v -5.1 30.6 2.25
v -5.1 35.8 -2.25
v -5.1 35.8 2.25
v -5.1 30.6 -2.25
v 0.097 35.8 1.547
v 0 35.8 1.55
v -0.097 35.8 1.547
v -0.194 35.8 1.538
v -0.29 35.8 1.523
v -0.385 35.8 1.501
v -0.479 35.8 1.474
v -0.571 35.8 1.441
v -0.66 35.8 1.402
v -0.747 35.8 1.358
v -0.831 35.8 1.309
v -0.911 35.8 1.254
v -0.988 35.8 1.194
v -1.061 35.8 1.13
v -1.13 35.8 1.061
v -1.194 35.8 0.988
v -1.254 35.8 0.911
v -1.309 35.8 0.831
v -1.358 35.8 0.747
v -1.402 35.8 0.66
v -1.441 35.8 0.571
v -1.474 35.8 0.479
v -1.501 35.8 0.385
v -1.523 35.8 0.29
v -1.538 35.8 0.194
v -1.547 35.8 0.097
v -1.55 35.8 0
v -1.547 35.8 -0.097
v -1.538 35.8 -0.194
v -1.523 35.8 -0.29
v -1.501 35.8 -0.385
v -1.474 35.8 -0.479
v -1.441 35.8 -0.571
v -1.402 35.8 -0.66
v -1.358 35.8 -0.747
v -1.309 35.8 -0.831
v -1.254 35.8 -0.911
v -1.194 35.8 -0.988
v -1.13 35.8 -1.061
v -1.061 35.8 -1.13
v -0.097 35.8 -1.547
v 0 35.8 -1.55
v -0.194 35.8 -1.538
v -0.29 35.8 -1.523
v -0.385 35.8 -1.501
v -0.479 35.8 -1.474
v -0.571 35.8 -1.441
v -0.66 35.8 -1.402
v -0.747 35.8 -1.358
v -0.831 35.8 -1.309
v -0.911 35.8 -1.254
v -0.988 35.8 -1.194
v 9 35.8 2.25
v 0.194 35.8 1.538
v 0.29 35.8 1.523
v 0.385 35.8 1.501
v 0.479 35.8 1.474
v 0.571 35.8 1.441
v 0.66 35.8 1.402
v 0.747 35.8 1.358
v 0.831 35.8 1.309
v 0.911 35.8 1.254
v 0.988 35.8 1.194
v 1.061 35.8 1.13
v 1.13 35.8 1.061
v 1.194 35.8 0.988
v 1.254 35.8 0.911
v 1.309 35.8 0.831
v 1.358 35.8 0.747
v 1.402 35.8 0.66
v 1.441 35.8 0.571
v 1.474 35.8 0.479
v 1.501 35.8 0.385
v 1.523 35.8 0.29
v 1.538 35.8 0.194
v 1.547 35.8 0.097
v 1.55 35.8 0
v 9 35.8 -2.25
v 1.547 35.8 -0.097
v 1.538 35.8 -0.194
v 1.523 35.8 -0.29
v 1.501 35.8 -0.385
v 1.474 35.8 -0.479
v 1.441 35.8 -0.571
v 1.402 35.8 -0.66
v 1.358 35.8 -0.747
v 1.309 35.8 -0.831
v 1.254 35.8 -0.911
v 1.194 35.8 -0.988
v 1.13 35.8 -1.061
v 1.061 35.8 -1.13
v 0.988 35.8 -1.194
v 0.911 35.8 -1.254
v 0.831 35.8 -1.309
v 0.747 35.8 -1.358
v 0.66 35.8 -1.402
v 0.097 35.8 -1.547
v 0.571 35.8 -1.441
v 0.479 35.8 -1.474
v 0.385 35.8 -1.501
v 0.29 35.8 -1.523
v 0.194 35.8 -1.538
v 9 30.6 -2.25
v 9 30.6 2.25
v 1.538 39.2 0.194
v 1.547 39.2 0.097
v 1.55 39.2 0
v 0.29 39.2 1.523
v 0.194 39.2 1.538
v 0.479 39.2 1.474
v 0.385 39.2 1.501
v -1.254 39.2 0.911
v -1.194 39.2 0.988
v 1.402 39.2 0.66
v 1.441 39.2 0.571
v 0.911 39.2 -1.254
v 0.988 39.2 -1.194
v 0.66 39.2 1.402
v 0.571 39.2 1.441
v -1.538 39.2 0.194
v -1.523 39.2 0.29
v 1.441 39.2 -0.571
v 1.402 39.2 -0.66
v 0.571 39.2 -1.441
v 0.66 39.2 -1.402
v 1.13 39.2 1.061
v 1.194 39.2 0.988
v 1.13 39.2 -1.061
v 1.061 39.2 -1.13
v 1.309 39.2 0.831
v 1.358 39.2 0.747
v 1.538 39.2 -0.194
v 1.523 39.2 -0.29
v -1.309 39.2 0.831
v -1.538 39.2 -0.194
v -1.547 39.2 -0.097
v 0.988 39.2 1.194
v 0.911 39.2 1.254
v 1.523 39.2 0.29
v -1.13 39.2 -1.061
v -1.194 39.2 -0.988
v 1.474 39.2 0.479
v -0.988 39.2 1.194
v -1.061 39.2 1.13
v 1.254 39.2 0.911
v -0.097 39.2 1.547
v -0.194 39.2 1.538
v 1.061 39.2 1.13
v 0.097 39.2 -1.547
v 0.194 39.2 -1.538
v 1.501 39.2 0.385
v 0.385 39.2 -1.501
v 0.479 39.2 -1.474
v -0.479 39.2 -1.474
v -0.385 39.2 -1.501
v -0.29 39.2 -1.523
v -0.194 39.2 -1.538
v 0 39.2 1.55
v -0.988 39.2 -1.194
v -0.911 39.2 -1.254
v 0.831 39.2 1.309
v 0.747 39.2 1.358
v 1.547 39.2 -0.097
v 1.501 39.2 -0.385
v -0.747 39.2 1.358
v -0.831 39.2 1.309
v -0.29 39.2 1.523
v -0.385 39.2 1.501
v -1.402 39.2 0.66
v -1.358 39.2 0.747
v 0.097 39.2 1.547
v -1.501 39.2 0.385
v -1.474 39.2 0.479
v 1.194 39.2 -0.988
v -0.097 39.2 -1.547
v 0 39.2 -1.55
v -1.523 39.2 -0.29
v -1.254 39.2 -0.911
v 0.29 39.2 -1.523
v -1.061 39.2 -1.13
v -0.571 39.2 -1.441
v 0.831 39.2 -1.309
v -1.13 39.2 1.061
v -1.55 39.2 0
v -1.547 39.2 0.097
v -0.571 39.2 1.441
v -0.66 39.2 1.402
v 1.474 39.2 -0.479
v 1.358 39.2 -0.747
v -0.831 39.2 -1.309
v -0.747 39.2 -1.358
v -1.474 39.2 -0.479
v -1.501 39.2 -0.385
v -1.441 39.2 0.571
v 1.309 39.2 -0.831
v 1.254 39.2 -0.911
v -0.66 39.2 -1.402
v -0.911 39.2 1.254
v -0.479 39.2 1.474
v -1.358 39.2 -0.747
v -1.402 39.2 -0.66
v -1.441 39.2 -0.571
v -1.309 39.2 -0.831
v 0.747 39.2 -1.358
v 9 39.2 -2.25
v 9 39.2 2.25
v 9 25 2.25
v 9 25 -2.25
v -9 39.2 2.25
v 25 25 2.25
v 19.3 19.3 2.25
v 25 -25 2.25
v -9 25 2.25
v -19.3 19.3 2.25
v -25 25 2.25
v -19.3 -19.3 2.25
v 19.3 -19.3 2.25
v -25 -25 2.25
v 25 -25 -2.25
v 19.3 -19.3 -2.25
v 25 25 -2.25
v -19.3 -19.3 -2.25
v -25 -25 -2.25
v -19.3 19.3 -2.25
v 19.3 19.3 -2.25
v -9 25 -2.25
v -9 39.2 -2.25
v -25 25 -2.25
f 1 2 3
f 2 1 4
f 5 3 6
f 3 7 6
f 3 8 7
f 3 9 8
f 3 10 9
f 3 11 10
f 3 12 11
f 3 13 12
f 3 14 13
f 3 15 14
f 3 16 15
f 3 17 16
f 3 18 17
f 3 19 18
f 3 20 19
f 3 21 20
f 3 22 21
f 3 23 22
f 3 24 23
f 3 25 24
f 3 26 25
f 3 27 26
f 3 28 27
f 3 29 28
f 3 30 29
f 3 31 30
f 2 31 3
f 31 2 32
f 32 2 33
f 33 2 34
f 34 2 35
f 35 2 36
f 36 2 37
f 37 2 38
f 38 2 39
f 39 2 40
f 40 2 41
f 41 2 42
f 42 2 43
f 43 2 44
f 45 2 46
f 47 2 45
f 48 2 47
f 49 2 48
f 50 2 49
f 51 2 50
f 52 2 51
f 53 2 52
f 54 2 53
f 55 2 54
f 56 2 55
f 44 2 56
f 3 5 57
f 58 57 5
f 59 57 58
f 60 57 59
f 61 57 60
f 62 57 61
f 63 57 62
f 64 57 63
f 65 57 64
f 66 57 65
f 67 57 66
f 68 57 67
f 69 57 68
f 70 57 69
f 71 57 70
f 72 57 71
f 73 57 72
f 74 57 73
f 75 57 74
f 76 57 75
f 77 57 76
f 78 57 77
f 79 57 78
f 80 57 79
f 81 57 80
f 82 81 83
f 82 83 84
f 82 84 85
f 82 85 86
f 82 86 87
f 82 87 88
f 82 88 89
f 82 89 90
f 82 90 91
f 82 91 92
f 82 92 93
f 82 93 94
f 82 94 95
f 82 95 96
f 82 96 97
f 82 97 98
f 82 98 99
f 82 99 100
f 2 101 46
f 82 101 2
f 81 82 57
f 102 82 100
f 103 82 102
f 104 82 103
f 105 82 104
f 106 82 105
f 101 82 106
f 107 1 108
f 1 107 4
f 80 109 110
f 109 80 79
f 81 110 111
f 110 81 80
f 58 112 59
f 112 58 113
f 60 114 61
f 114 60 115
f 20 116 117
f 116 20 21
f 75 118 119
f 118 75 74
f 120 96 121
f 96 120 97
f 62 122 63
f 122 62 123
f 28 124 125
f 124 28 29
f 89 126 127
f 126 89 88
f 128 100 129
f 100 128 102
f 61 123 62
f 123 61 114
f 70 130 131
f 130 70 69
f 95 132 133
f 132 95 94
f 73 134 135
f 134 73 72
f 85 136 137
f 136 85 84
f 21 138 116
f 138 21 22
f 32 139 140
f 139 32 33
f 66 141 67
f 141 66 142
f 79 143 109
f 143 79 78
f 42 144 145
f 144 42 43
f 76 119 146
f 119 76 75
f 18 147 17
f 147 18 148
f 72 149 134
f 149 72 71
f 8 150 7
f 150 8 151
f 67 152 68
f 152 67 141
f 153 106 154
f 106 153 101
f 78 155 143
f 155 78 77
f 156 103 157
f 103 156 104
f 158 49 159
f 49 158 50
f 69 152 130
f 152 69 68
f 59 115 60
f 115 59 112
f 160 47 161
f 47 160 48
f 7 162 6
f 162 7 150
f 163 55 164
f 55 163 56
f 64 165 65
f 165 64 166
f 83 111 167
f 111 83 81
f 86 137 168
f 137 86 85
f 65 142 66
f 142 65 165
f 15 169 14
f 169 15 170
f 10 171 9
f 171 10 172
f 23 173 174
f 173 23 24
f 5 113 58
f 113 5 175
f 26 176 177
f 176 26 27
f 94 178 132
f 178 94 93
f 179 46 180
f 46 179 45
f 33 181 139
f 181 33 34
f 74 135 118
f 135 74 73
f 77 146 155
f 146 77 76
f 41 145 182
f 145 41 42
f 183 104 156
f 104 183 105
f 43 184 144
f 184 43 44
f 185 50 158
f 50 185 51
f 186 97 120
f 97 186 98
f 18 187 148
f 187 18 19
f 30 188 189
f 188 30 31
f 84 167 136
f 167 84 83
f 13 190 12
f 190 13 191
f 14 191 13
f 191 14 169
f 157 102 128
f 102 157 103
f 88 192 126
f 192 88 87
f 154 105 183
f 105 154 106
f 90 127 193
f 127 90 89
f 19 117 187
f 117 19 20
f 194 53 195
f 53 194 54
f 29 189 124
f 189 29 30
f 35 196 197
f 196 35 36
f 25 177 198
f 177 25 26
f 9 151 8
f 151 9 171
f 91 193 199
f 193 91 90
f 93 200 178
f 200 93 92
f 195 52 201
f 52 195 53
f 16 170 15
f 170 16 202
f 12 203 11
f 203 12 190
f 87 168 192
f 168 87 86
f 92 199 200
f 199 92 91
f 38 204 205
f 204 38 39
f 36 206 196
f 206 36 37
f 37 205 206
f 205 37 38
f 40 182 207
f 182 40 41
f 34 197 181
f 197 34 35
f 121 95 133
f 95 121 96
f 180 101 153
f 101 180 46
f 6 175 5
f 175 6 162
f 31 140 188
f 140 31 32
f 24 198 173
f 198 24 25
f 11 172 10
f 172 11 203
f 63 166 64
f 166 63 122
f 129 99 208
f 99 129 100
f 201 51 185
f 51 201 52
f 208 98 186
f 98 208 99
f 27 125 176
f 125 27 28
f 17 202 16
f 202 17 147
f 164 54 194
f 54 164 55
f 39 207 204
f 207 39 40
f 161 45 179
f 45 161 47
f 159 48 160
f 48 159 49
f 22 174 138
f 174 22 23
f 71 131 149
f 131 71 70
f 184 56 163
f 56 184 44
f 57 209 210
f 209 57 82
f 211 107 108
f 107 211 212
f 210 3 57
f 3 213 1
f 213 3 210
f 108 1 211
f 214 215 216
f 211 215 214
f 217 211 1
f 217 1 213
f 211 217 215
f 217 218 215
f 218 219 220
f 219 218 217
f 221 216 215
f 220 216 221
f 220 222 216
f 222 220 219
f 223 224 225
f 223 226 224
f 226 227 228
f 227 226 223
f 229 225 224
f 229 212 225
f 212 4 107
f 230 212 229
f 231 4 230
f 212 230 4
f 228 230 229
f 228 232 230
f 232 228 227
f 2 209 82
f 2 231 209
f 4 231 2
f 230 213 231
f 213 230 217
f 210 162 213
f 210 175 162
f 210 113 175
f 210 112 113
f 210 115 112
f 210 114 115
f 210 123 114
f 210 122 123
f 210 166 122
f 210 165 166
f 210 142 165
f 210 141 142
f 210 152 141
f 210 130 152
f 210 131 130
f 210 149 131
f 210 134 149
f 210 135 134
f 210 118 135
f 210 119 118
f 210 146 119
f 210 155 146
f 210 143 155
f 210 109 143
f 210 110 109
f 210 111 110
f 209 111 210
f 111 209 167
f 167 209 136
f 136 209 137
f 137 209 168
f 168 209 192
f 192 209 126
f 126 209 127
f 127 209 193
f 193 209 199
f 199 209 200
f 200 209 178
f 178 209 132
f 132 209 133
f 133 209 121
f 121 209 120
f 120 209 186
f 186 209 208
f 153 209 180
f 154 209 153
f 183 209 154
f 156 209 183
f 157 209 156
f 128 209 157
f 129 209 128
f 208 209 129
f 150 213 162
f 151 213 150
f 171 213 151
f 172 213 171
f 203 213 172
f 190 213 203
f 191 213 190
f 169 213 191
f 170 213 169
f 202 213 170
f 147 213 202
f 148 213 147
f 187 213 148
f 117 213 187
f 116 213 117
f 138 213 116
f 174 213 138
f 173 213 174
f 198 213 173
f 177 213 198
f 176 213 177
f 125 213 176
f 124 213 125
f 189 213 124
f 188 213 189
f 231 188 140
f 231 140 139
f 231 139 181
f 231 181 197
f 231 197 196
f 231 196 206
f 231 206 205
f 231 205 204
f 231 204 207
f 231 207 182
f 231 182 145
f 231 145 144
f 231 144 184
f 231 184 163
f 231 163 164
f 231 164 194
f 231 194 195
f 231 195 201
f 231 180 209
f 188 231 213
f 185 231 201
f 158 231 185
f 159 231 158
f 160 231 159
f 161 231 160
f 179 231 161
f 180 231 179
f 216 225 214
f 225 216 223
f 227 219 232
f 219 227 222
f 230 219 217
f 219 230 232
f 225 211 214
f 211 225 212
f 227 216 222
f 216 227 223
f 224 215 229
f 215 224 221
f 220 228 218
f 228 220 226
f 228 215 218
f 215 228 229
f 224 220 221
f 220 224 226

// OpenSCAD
// file: global_variables.scad
/*
re written 3d models for the FlyPi. Making it easier to read
and to change. The main idea is simple, taking structures and variables
that are common between parts and making them into modules, 
library files. 


Created by A.M. Chagas 2017 CC BY 4.0
Derived from the original files created by T. Baden


global_variables  file has the variables that will be used 
by other parts
*/

tolerance = 0.1; // Global gap between all parts that need to slide

$fn=20;




//////////////////////////////////////////////////////////////////////////////


//variables related  to square_mount///////////////////////////////////////
//variables for the attachment where parts connect to mounting poles
posx = 18;
posy = 20;
posz = 5;
negx = 10+2*tolerance;
negy = 5+2*tolerance;
negz = posz+1;

screwd = 3.1;//2.95; // diameter of the screw used to fix the parts 

fitx_hole = 10;//x dimension of hole that will fit with the mounting poles
fity_hole = 5; //y dimension of hole that will fit with the mounting poles

fitx = 20; // x dimension of the material that will go around the mounting
          // holes
fity = 22; // y dimension of the material that will go around the mounting
          // holes
mink_dia=0; //sets the diameter of the cylinders used to round pieces up

part_border = 5; //how much larger in x and y  than the actual parts 
                  //being held the printed part is going to be
partx = 25;
party = 25;
offsety = (party+posy)/2+part_border-2;

partz  = 5; //how thick the part printed is going to be

///////raspberry pi///////////////////////////////////////////////////////////
rpiwidth = 56; // Dimensions of the RPi 2 (below also for RPi 2)

rpiholedisy = 49;
rpiholedisx = 58;
rpigrounddist = 4.2;
//////////////////////////////////////////////////////////////////////////

//////////////////CAMERA VARIABLES////////////////////////////////////
// RPi Camera Type
camx = 32.2+2*tolerance;//24 for "classic RPi Cam V1. i.e the one
                        //without the adjustable focus lens";
camy = 32.2+2*tolerance;//25 for "classic RPi Cam V1";



camxoffset = 2.50;// 2.5 for "classic RPi Cam";
cam_pcb_z = 2; // thickness of camera mount
C_Z2 = 5; // thickness of cmaera mount walls
C_ridge = 2; // width of ridge for camera mount
CamGroove_X = 12;
CamGroove_Y = 16.1;
CamGroove2_Y = 24;

MiniGrooveX = 15;

////////////////////////////////////////////////////////////////////////////




//peltier dimensions///////////////////////////////////////////////////////
peltierx = 40+1; // Size of the Peltier
peltiery = 40+1;
peltierz = 3; // Thickness of the Peltier
peltierborder = 12; // Extension in X dimension of base next to Peltier
peltierridge = 1.6; // below Peltier, width of ridge
peltiercable = 3; // thickness of Peltier cable slid
//////////////////////////////////////////////////////////////////////////////

//base///////////////////////////////////////////////////////////////////////
baseextension = 70;
basex=peltierx+2*peltierborder+partz+baseextension;
basey=rpiwidth+2*peltiercable;
basez=19;
stabid=24;

////////////////////////////////////////////////////////////////////



////////markerled////////////////////////////////////////////////////////
markerledd = 7; // diam of RGB LED hole in base
markerledz = 2; // depth beneath surface
markerx = 4; // Module A, viewhole size

///////////////////////////////////////////////////////////////////////////

///connection holes and stick dimensions////////////////////////////
conntubed=11;
conntubeh=16;
conntubed2=8.5;
stickx=10;
sticky=5;
stickz=18;
//18 short stick
//60 medium stick
//120 long stick

//ring
ring_de = 51; //external diameter of the ring
ring_di = 35; //internal diameter of the ring

////////////////////fluorescence tubes//////////////////////////

tubewall = 3;
tubed = 22;
tubeh = 30;
plugh=2;
// file: global_modules.scad
include<global_variables.scad>




$fn=50;

module screw(screwd,screwl,screwheadd,screwheadl){
cylinder(d=screwd+2*tolerance,h=screwl,center=true);
translate([0,0,screwl/2+screwheadl/2]){
cylinder(d=screwheadd,h=screwheadl,center=true);
}//translate
}//module screw


module rpiholes(){
translate([rpiholedisx/2,rpiholedisy/2,0]){
tube(tubede=screwde,tubedi=screwd,tubeh=screwh+partz/2);
}//translate

translate([rpiholedisx/2,-rpiholedisy/2,0]){
tube(tubede=screwde,tubedi=screwd,tubeh=screwh+partz/2);
}//translate

translate([-rpiholedisx/2,-rpiholedisy/2,0]){
tube(tubede=screwde,tubedi=screwd,tubeh=screwh+partz/2);
}//translate

translate([-rpiholedisx/2,rpiholedisy/2,0]){
tube(tubede=screwde,tubedi=screwd,tubeh=screwh+partz/2);
}//translate
}//module

module tube(tubede=conntubed, 
              tubedi=conntubed2, 
              tubeh=conntubeh){
    difference(){
        cylinder(d=tubede,h=tubeh,center=true);
        cylinder(d=tubedi,h=tubeh+1,center=true);
    }//difference

}//module
/*
module stabi(){
    
    difference(){
    cylinder(d=stabid,h=2*part_border-peltiercable,center=true);
    
    translate([stabid/2-(stabid/2)/2,0,0]){
    cube([stabid/2,partz,20],center=true);
    }//translate
    }//difference
}//module

module circholes(){
    cylinder(d=conntubed,h=basey+5,center=true);
    translate([0,conntubed+1,0]){
    cylinder(d=conntubed+tolerance,h=basey+5,center=true);
    }
    translate([0,-conntubed-1,0]){
    cylinder(d=conntubed+tolerance,h=basey+5,center=true);
    }

    }//module
    
 */   
module attachment(posx=posx,
                    posy=posy,
                    posz=posz,
                    negx=negx,
                    negy=negy,
                    negz=negz,
                    screwd=screwd){
    
difference(){
    //minkowski(){
    cube([posx-mink_dia,posy-mink_dia,posz-mink_dia],center=true);
      //  sphere(d=mink_dia, center=true);
        
        //}//minkowski
union(){
    translate([0,posy/5,0]){
      // minkowski(){
    cube([negx-mink_dia,negy-mink_dia,posz+mink_dia],center=true);
      // sphere(d=mink_dia,center=true);
        //    }//minkowski
    }//translate
    translate([0,posy/2,0]){
    rotate([90,0,0]){
        cylinder(d=screwd,h=posy/2,center=true,$fn=100);
        }//rotate
    }//translate
}//union

    }//difference

}//module


module main(partx=partx,
              party=party,
              partz=partz){
    
    
  //  minkowski(){

    cube([partx+2*part_border-mink_dia,
          party+2*part_border-mink_dia,
          partz],center=true);
    //rotate([0,90,0]){
    //sphere(d=mink_dia, center=true);    
    //}
    //rotate([90,0,0]){
    //cylinder(r=mink_dia,h=1, center=true);    
    //}
    //cylinder(r=mink_dia,h=1, center=true);
//}//minkowski

    
    }
  
module combined(){
    //main(partx,party,part_border,partz-1);
    main();
    translate([0,(party+posy)/2+part_border-2,0]){
    attachment(posx,posy,posz,negx,negy,negz,screwd);
    }//translate   
       
} 

       
module sideattachment(posx=posx,
                        posy=posy,
                        posz=posz,
                        negx=negx,
                        negy=negy,
                        negz=negz,
                        screwd=screwd){
    
difference(){
    //minkowski()
    {
    cube([posx-mink_dia,posy-mink_dia,posz],center=true);
      //  sphere(d=mink_dia, center=true);
    //    }//minkowski
union(){
    translate([5,posy/5,0]){
   // minkowski(){
        cube([negx+10-mink_dia,negy-mink_dia,negz],center=true);
     //   sphere(d=mink_dia,center=true);
       // }
    }//translate
    translate([0,posy/2,0]){
    rotate([90,0,0]){
        cylinder(d=screwd,h=posy/2,center=true,$fn=100);
        }//rotate
    }//translate
}//union

    }//difference

}//module

//sideattachment();
//combined();
//main();
//minkowski(){
//attachment();
//    sphere(d=1,center=true);
}
//main();
// main file
/* Part library for the frame of the FlyPi.
Written by AM Chagas, CC By 4.0 -

First publication: 21.12.2017

Derived from the work of T. Baden 2015.

The complete library was rewriten from scratch to:
    - Be modular, each part is described and contained in one file
    - common variables and modules are contained in "global files", so that they can be called from other files, and there is no need to re-write code.
    - edges are made more circular, with Minkowsky calls, which makes rendering slower, but should lead to nicer prints.
    - to facilitate larger scale production. 

This was originally published as part of the product development for Prometheus Science (www.prometheus-science.com). Questions and inquires can be directed to the FlyPi Forum:
      www.prometheus-science.com/en_GB/forums/forum/flypi-user-forum/
    

This files describes the a holder for a light diffuser)

*/
include<global_modules.scad>
use<global_variables.scad>


Link_Opening = 1;
partx = 40;
party = 40;
partz=4.5;

diffuserx = 38.5+tolerance;
diffusery = 38.5+tolerance;

module diffusor(){
difference(){
    union(){
    main(party=party-mink_dia,partx=partx-mink_dia,partz=partz);
    translate([0,-(-(camx+posx)/2-part_border+1),0]){
sideattachment(posz=partz);
}//translate
}//union
    cube([diffuserx,diffusery,partz+10],center=true);
}//difference
}//module

diffusor();
